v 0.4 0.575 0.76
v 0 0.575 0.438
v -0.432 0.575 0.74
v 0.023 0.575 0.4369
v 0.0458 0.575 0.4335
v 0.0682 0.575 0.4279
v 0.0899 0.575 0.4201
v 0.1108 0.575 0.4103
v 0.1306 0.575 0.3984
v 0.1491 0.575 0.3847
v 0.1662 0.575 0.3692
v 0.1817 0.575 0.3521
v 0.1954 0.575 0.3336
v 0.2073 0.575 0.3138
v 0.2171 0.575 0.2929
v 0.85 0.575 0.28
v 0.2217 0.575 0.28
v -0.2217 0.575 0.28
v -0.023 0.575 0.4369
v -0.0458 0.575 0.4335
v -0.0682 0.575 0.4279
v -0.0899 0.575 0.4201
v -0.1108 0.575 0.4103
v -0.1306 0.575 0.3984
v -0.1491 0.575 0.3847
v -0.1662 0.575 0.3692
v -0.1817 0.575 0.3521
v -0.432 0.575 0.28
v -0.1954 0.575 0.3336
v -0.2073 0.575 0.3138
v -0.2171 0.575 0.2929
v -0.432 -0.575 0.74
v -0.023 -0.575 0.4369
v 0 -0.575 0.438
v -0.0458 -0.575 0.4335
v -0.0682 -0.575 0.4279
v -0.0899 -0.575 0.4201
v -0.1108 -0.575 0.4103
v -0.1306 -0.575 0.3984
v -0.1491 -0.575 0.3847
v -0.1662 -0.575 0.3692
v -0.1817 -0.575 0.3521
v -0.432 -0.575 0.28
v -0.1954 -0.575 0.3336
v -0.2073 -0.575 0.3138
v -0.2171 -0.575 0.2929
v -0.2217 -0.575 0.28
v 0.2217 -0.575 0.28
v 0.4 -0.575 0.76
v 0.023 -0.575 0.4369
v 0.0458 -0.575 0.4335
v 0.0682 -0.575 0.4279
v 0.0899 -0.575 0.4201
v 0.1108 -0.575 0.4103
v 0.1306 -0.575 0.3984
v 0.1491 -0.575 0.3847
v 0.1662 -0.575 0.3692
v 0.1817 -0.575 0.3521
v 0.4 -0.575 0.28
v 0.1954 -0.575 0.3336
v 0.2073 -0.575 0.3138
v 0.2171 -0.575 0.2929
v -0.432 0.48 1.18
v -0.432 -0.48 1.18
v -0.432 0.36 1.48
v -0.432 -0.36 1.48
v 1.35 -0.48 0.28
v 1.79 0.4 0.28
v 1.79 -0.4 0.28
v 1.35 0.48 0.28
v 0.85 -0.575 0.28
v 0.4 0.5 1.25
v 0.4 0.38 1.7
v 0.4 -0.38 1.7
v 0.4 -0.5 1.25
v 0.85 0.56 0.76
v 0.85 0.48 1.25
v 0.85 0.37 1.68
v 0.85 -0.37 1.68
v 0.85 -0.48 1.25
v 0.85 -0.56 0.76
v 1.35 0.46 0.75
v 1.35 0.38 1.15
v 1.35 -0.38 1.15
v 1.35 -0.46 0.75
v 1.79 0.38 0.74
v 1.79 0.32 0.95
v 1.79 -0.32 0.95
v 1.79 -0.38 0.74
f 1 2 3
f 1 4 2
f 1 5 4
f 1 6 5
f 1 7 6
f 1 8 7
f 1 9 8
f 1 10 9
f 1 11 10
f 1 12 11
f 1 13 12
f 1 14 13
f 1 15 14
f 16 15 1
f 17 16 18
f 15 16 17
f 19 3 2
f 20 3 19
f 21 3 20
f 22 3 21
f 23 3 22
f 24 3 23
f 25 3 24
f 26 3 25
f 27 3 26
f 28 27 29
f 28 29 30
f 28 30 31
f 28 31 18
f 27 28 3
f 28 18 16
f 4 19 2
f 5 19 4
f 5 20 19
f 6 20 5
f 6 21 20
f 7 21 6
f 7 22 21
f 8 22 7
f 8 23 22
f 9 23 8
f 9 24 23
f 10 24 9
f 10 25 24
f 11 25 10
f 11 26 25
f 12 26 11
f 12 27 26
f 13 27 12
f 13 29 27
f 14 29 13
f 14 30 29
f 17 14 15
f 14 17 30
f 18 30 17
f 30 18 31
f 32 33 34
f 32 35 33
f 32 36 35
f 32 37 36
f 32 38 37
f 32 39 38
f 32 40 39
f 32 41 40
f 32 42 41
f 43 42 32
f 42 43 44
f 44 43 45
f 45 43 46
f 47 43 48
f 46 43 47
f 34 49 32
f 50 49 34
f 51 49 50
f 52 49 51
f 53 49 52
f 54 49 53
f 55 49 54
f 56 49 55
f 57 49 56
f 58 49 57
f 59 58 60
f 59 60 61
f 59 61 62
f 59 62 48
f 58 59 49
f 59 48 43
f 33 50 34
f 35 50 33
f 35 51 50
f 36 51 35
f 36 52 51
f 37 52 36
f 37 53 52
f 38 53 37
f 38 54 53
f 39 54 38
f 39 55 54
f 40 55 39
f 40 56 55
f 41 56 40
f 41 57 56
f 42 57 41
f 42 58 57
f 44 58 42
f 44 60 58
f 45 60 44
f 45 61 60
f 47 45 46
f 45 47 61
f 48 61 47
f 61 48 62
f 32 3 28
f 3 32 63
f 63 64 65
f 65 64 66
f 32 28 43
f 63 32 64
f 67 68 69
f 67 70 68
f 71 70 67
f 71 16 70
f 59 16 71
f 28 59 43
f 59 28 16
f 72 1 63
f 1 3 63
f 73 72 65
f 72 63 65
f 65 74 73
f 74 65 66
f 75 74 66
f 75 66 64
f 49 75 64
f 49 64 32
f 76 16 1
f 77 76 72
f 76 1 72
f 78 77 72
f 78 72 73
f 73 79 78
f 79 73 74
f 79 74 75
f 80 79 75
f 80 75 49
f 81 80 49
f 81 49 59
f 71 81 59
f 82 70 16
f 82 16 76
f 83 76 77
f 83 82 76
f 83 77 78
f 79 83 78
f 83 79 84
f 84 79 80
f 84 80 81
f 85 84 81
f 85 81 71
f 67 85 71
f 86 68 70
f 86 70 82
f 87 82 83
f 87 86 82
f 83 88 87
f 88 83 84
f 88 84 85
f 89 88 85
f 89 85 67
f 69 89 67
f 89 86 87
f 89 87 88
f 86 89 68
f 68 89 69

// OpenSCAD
// Copyright 2026 E-Trike
// Licensed under the Apache License, Version 2.0
//
// Canonical Bajaj RE tuktuk body silhouette.
// Coordinates use ROS convention: +X forward, +Y left, +Z up.

$fn = 64;

module body_envelope() {
  polyhedron(
    points = [
      // Station 0: Rear Back Panel (X = -0.432)
      // Sloped rear canopy roof tapering down to Z = 1.480
      [-0.432, -0.575, 0.280], // 0: rear left floor
      [-0.432,  0.575, 0.280], // 1: rear right floor
      [-0.432,  0.575, 0.740], // 2: rear right beltline
      [-0.432,  0.480, 1.180], // 3: rear right shoulder
      [-0.432,  0.360, 1.480], // 4: rear right roof
      [-0.432, -0.360, 1.480], // 5: rear left roof
      [-0.432, -0.480, 1.180], // 6: rear left shoulder
      [-0.432, -0.575, 0.740], // 7: rear left beltline

      // Station 1: Passenger Cabin Peak (X = 0.400)
      // Maximum cabin height Z = 1.700
      [ 0.400, -0.575, 0.280], // 8: mid left floor
      [ 0.400,  0.575, 0.280], // 9: mid right floor
      [ 0.400,  0.575, 0.760], // 10: mid right beltline
      [ 0.400,  0.500, 1.250], // 11: mid right shoulder
      [ 0.400,  0.380, 1.700], // 12: mid right roof
      [ 0.400, -0.380, 1.700], // 13: mid left roof
      [ 0.400, -0.500, 1.250], // 14: mid left shoulder
      [ 0.400, -0.575, 0.760], // 15: mid left beltline

      // Station 2: Windshield Top / Front Cabin (X = 0.850)
      [ 0.850, -0.575, 0.280], // 16: cabin front left floor
      [ 0.850,  0.575, 0.280], // 17: cabin front right floor
      [ 0.850,  0.560, 0.760], // 18: cabin front right beltline
      [ 0.850,  0.480, 1.250], // 19: cabin front right shoulder
      [ 0.850,  0.370, 1.680], // 20: cabin front right roof
      [ 0.850, -0.370, 1.680], // 21: cabin front left roof
      [ 0.850, -0.480, 1.250], // 22: cabin front left shoulder
      [ 0.850, -0.560, 0.760], // 23: cabin front left beltline

      // Station 3: Windshield Base / Cowl (X = 1.350)
      [ 1.350, -0.480, 0.280], // 24: cowl left floor
      [ 1.350,  0.480, 0.280], // 25: cowl right floor
      [ 1.350,  0.460, 0.750], // 26: cowl right beltline
      [ 1.350,  0.380, 1.150], // 27: cowl right windshield mid
      [ 1.350, -0.380, 1.150], // 28: cowl left windshield mid
      [ 1.350, -0.460, 0.750], // 29: cowl left beltline

      // Station 4: Front Apron (X = 1.790)
      [ 1.790, -0.400, 0.280], // 30: apron left floor
      [ 1.790,  0.400, 0.280], // 31: apron right floor
      [ 1.790,  0.380, 0.740], // 32: apron right beltline
      [ 1.790,  0.320, 0.950], // 33: apron right top
      [ 1.790, -0.320, 0.950], // 34: apron left top
      [ 1.790, -0.380, 0.740]  // 35: apron left beltline
    ],
    faces = [
      // Rear Face (X = -0.432)
      [0, 1, 2, 3, 4, 5, 6, 7],

      // Station 0 -> Station 1 (Rear Cabin to Peak)
      [0, 8, 9, 1],
      [1, 9, 10, 2],
      [2, 10, 11, 3],
      [3, 11, 12, 4],
      [4, 12, 13, 5],
      [5, 13, 14, 6],
      [6, 14, 15, 7],
      [7, 15, 8, 0],

      // Station 1 -> Station 2 (Cabin Peak to Windshield Top)
      [8, 16, 17, 9],
      [9, 17, 18, 10],
      [10, 18, 19, 11],
      [11, 19, 20, 12],
      [12, 20, 21, 13],
      [13, 21, 22, 14],
      [14, 22, 23, 15],
      [15, 23, 16, 8],

      // Station 2 -> Station 3 (Windshield Slope)
      [16, 24, 25, 17],
      [17, 25, 26, 18],
      [18, 26, 27, 19],
      [19, 27, 20],
      [20, 27, 28, 21],
      [21, 28, 22],
      [22, 28, 29, 23],
      [23, 29, 24, 16],

      // Station 3 -> Station 4 (Front Cowl to Apron)
      [24, 30, 31, 25],
      [25, 31, 32, 26],
      [26, 32, 33, 27],
      [27, 33, 34, 28],
      [28, 34, 35, 29],
      [29, 35, 30, 24],

      // Front Face (X = 1.790)
      [30, 35, 34, 33, 32, 31]
    ],
    convexity = 10
  );
}

module rear_wheel_opening(side) {
  // Fitted circular rear wheel arch clearance clipped above Z = 0.280 floor plane.
  intersection() {
    translate([0, side * 0.725, 0.203])
      rotate([90, 0, 0])
        cylinder(h = 0.300, r = 0.235, center = true);
    translate([-0.350, -1.000, 0.280001])
      cube([0.700, 2.000, 1.000]);
  }
}

difference() {
  body_envelope();
  rear_wheel_opening(1);
  rear_wheel_opening(-1);
}
